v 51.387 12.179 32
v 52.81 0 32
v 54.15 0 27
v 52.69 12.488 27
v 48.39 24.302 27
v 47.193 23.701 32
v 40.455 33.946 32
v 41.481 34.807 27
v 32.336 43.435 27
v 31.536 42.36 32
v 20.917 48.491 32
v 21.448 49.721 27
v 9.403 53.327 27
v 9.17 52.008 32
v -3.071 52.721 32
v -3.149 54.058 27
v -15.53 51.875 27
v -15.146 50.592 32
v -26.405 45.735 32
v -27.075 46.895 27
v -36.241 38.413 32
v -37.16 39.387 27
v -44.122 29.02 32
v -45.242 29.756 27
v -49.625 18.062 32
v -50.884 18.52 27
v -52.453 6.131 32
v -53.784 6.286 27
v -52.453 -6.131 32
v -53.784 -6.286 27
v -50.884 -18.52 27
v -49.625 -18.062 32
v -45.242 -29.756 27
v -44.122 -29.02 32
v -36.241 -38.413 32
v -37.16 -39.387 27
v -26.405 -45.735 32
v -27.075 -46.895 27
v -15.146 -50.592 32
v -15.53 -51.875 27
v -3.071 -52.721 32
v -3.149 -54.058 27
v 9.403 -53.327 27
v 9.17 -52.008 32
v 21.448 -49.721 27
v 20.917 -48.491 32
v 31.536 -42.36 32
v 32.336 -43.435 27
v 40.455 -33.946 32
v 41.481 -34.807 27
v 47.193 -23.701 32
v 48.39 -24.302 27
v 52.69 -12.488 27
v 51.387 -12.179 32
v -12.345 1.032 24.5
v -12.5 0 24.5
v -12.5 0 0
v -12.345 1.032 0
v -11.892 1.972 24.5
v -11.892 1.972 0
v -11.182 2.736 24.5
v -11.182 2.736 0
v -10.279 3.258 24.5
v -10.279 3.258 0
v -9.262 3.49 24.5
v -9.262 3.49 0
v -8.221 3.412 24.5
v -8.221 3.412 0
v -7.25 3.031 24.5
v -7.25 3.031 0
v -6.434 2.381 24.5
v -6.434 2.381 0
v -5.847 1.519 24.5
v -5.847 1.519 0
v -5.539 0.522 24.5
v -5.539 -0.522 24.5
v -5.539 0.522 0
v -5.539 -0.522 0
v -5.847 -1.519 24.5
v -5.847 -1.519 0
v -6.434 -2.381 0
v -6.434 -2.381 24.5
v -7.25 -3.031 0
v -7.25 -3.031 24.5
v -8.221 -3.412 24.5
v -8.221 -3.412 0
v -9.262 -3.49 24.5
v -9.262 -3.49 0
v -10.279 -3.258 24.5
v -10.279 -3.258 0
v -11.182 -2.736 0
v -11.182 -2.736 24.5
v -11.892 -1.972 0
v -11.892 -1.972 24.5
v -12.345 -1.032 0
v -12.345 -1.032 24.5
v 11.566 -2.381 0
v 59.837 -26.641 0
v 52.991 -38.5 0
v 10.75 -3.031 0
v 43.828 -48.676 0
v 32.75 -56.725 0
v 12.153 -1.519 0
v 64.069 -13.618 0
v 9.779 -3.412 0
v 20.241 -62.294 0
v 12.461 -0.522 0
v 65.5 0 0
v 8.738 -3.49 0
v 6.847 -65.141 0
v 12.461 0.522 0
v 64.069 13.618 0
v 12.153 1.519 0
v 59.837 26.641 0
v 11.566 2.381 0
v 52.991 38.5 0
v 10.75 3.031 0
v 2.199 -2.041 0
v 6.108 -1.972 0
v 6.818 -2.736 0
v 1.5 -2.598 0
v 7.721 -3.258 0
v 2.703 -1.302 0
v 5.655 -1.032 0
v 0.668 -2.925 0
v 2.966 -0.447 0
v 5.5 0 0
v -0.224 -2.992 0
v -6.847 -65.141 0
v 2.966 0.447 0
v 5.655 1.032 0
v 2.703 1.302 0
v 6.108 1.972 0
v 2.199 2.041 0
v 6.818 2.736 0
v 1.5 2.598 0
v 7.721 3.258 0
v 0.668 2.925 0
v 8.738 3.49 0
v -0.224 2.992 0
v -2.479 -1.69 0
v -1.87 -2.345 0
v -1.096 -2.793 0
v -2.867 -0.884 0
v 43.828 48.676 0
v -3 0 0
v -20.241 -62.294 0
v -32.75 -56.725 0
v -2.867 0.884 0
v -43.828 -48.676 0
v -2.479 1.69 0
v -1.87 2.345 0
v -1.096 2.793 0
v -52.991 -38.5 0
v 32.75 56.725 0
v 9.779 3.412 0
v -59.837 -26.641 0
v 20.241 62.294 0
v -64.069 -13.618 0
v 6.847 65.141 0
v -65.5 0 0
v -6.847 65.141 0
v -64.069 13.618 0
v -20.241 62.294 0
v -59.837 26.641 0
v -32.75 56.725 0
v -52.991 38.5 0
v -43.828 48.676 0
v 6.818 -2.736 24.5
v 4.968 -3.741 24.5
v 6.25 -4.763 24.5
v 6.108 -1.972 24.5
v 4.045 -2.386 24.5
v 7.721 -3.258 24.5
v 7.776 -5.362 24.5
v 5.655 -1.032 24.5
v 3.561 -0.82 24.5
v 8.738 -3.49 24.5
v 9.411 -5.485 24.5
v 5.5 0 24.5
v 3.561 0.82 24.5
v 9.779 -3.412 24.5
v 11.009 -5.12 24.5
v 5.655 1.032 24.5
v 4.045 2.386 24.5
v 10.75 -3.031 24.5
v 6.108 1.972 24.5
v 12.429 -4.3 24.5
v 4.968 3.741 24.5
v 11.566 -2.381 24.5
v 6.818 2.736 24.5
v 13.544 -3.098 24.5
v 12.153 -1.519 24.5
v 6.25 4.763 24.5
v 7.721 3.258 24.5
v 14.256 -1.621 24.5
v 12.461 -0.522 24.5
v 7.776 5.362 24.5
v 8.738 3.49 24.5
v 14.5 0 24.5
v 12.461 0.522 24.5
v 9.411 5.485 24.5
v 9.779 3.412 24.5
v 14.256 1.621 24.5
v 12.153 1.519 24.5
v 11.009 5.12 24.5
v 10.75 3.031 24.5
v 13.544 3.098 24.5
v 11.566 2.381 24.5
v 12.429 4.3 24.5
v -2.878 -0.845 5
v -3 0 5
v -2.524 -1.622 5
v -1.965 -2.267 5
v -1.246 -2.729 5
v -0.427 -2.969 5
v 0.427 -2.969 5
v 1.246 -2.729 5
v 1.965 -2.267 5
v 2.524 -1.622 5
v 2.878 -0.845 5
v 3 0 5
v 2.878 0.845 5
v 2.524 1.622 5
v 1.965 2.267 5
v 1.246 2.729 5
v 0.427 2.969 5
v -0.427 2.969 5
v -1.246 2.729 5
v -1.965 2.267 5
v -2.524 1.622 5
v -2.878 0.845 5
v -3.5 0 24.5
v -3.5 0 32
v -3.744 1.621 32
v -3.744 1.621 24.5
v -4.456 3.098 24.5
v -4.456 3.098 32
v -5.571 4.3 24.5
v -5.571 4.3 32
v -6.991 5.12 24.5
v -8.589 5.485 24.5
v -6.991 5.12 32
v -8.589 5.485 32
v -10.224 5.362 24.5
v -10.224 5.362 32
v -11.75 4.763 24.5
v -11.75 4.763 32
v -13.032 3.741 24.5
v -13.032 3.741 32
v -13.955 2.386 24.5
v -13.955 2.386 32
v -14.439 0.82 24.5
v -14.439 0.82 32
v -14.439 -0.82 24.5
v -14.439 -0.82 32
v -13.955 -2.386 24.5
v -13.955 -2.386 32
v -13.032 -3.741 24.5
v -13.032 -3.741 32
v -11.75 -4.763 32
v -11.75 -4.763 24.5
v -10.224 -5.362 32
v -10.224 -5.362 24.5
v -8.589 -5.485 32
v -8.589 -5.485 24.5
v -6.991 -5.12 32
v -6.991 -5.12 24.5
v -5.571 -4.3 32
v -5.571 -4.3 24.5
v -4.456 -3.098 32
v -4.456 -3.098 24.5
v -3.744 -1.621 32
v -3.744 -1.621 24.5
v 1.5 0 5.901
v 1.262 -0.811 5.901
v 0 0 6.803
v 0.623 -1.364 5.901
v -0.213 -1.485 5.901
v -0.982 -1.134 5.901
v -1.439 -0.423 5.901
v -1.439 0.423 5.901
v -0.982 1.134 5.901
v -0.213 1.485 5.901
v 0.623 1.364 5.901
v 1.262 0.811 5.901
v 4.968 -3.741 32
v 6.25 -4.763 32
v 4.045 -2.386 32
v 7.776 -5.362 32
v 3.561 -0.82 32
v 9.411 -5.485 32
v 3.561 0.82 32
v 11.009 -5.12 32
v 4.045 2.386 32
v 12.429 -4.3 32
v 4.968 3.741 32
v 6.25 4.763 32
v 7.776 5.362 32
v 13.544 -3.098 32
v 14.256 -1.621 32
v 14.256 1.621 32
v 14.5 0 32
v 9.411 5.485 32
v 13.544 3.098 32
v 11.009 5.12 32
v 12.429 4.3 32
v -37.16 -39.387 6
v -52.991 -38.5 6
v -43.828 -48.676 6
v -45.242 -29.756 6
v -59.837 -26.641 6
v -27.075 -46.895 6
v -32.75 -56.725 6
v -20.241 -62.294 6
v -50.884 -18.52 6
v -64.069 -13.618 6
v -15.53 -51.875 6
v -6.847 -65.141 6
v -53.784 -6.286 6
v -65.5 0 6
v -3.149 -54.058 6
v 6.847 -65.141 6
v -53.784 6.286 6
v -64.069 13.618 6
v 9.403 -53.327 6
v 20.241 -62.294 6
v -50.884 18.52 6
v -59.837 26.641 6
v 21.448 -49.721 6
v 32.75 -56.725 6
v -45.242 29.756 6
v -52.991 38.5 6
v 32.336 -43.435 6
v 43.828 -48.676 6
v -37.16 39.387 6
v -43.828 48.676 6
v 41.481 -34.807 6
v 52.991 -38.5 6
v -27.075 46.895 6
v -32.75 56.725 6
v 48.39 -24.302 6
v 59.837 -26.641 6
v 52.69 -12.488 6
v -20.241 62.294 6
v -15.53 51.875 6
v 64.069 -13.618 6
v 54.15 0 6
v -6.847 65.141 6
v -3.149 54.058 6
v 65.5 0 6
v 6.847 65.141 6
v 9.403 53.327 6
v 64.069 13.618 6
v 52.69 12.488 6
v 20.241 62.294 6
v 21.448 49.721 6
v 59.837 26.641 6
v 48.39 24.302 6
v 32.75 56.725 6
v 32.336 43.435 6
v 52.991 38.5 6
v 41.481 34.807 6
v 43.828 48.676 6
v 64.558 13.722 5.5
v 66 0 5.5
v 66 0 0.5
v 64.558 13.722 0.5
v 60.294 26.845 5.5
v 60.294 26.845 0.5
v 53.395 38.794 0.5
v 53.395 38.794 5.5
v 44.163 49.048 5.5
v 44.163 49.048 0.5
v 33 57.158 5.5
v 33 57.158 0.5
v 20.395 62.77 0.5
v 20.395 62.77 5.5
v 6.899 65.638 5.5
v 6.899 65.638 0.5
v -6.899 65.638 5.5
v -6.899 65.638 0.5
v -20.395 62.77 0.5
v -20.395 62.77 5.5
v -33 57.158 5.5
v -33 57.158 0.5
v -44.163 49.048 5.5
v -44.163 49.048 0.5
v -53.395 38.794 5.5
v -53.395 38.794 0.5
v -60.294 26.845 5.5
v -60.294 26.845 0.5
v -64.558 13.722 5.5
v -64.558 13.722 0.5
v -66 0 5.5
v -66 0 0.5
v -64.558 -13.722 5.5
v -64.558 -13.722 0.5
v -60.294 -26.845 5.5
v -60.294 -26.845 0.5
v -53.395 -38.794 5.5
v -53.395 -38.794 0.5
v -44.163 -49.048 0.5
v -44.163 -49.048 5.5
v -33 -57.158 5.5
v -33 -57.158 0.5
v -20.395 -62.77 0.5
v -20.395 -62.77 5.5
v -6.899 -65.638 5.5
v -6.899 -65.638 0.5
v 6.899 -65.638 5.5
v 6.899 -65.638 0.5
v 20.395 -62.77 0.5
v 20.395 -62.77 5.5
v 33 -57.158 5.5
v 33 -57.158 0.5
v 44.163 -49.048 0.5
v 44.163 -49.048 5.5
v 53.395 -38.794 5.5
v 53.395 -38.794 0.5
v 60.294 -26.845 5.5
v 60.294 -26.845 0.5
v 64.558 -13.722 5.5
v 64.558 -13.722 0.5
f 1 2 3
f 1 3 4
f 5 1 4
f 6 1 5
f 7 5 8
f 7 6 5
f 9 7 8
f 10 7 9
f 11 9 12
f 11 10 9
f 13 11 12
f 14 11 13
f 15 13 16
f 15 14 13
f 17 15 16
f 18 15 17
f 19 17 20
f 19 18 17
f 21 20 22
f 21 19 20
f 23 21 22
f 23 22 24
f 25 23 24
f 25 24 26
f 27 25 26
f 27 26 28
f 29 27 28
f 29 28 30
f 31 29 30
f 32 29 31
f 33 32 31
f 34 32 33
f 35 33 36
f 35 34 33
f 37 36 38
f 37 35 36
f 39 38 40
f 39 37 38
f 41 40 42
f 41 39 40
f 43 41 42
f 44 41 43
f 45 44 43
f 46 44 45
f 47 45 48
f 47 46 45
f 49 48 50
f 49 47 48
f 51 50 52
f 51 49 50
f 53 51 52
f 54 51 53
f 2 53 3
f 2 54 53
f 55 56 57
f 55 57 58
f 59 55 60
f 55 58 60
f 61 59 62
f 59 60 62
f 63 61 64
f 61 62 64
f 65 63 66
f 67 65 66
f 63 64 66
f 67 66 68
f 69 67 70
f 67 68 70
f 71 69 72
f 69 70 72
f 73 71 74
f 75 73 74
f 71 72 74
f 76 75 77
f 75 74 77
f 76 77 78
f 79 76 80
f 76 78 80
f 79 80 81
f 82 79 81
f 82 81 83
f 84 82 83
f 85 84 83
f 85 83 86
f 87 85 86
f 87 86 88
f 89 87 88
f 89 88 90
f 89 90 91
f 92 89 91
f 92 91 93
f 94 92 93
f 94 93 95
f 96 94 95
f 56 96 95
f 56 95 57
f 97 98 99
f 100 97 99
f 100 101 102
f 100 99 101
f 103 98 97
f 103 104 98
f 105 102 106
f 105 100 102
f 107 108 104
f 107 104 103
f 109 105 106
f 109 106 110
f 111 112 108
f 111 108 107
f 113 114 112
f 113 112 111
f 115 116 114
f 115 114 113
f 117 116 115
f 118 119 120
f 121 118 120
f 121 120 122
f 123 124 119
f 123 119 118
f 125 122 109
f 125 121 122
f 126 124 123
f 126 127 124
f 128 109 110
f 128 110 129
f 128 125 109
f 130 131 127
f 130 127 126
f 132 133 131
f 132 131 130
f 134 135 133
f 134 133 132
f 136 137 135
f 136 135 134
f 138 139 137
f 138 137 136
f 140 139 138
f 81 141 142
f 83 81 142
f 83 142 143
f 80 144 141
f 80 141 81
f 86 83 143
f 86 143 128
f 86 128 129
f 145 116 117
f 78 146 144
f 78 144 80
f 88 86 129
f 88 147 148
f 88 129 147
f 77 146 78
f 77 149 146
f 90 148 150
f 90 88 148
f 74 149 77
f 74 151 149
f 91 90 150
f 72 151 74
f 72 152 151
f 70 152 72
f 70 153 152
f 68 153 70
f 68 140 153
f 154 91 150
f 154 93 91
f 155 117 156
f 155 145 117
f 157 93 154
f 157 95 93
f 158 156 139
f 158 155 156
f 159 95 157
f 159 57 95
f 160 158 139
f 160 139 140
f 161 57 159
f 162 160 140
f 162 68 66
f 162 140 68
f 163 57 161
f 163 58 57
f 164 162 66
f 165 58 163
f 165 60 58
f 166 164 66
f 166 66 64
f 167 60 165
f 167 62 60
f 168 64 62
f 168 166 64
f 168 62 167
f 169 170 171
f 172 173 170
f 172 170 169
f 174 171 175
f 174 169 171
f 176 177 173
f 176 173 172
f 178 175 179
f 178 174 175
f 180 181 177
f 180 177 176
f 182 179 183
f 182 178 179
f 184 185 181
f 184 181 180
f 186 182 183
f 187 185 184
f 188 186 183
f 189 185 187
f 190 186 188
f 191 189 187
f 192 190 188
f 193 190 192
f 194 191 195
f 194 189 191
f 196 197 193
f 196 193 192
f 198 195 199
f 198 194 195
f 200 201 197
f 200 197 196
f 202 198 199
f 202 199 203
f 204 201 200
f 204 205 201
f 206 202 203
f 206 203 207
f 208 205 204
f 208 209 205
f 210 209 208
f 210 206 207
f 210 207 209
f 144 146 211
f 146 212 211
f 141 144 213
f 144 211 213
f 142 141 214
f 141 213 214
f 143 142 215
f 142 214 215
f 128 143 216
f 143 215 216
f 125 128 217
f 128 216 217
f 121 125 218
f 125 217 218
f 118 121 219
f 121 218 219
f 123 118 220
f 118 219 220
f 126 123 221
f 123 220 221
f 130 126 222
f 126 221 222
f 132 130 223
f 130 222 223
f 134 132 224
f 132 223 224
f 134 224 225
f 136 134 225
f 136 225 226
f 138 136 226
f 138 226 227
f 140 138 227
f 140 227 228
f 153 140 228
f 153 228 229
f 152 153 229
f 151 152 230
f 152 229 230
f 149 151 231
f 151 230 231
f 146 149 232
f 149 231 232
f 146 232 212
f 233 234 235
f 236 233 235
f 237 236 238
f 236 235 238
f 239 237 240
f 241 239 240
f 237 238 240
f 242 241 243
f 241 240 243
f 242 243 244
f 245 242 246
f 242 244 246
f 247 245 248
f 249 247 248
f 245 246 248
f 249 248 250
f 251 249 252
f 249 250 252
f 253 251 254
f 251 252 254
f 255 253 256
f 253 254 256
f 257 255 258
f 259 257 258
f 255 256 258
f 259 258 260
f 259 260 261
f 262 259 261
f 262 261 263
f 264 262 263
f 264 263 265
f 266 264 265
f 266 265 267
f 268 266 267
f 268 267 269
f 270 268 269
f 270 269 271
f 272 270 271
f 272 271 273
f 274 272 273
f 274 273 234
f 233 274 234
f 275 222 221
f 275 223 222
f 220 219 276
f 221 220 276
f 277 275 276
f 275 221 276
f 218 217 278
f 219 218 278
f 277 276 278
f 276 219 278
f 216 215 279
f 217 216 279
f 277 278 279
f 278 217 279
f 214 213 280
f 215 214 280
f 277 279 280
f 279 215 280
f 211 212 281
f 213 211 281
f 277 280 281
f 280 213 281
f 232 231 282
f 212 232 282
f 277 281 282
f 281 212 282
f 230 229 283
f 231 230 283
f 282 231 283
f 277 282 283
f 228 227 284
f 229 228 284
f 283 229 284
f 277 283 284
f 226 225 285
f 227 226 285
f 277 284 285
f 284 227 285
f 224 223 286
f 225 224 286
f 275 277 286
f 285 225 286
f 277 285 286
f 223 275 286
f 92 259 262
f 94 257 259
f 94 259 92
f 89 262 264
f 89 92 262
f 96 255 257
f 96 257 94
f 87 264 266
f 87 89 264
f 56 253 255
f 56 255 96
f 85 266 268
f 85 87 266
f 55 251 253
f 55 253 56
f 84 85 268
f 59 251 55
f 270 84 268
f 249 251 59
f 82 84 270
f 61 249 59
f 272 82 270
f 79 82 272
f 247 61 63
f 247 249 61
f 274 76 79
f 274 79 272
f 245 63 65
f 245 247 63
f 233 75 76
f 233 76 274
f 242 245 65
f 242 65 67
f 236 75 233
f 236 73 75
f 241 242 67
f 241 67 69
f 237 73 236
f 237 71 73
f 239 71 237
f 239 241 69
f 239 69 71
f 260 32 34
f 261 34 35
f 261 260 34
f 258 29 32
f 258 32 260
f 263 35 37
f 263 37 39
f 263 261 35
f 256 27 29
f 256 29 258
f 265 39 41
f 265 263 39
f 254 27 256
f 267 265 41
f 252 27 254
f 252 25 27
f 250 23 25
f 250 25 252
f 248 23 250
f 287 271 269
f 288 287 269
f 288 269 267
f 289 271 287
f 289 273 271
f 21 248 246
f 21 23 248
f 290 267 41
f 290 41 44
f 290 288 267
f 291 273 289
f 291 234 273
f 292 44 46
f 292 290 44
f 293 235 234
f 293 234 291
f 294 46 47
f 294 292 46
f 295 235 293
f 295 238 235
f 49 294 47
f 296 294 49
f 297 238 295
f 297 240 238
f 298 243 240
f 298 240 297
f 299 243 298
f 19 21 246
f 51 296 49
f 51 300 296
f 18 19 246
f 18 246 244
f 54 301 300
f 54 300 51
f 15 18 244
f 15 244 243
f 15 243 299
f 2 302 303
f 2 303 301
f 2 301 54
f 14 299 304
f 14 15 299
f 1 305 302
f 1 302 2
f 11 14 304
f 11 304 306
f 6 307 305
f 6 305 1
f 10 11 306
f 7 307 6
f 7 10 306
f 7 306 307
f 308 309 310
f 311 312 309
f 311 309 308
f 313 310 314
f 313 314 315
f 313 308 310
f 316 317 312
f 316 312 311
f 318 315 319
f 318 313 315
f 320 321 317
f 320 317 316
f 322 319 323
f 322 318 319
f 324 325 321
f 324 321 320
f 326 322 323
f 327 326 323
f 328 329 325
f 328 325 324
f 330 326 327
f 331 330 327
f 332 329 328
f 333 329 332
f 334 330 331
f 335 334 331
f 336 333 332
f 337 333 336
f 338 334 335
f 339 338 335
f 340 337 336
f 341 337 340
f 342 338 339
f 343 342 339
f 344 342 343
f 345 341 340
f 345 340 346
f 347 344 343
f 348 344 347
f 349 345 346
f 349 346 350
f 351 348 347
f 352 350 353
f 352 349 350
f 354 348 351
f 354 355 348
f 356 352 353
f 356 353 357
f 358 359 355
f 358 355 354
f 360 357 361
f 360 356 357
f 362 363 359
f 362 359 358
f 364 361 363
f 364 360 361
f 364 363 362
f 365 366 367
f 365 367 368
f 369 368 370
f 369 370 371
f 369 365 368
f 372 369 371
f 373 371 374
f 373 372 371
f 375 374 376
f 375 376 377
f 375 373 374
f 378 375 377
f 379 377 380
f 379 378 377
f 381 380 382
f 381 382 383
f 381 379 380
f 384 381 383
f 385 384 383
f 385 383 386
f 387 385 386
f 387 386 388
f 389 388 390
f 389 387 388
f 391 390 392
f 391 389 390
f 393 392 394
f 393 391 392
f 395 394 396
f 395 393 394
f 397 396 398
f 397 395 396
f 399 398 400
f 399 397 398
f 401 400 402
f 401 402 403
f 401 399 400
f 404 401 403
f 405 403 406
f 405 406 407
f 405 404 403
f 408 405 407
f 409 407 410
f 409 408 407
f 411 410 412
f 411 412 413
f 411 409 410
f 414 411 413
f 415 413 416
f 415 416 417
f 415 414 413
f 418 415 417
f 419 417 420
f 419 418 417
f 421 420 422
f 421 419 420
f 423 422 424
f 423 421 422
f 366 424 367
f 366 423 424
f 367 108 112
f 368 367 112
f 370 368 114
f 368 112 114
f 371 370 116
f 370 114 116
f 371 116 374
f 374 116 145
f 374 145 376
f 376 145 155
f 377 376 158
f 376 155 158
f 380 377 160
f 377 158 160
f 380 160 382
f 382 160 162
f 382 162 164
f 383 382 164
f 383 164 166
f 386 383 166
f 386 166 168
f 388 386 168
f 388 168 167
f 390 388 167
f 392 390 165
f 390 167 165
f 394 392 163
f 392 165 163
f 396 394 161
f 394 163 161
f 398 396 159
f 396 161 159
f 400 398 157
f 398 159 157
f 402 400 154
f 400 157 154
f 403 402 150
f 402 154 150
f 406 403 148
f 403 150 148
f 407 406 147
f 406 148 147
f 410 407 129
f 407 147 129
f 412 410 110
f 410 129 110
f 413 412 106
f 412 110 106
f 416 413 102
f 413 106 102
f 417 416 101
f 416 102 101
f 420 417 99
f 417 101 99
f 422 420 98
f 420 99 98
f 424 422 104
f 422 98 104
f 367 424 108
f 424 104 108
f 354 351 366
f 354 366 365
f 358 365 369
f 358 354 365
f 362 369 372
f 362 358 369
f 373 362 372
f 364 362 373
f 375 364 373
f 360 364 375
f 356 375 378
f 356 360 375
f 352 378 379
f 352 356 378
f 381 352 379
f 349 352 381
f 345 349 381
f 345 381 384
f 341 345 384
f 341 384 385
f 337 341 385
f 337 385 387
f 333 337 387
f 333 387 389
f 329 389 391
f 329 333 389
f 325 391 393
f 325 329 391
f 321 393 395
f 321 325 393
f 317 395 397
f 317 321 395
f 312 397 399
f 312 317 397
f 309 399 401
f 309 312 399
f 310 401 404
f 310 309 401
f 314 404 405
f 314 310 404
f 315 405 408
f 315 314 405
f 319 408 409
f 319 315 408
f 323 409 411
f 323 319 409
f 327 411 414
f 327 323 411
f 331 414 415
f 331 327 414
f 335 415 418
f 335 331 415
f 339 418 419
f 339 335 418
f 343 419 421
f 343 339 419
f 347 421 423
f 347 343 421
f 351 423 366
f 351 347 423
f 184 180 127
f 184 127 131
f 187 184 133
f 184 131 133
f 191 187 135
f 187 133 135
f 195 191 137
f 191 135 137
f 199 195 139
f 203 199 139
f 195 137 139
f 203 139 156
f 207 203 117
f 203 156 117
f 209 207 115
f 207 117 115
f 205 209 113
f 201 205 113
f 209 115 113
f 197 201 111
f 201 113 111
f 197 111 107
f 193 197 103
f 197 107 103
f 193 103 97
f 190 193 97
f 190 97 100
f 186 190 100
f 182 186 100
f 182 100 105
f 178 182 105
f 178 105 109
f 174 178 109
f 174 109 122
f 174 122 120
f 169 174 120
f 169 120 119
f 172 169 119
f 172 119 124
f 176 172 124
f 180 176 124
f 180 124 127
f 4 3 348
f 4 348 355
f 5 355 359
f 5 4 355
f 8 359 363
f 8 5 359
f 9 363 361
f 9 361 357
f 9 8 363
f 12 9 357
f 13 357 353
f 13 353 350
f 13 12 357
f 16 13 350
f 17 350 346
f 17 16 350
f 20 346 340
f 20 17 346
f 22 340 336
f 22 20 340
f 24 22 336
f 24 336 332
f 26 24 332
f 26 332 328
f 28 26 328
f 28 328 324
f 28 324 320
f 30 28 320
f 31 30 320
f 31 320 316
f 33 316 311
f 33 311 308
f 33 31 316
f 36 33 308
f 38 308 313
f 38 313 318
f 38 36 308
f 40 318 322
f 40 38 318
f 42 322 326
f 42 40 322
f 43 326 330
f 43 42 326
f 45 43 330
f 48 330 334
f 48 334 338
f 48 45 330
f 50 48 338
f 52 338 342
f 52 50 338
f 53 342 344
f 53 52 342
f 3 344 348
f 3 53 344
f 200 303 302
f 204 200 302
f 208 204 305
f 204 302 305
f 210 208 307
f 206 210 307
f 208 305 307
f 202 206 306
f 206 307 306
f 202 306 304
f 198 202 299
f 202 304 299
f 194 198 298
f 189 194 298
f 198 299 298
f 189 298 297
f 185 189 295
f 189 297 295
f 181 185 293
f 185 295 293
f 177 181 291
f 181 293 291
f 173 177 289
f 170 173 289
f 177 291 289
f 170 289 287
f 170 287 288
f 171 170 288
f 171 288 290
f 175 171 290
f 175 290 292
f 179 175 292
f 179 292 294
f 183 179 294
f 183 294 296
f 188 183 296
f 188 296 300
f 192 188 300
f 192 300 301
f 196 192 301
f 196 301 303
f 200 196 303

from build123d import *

# Parameters (mm, degrees)
F2_SIZE        = 0.5
F3_SIZE        = 0.5
F4_SIZE2       = 1.3397459622
F4_SIZE        = 5
F6_D           = 7
F7_D           = 7
F7_CBORE_D     = 11
F7_CBORE_DEPTH = 7.5
F9_D           = 6
F9_DEPTH       = 5
F9_TIP         = 1.8025818571


with BuildPart() as f1:
    # F0 (on Front) → F1 (revolve)
    with BuildSketch(Plane.XZ):
        Polygon((0, 32), (0, 0), (66, 0), (66, 6), (54.15, 6), (54.15, 32), align=None)
    revolve(axis=Axis((0, 0, 31.825657934), (0, 0, 1)))

    # F2
    f2_edges = [f1.edges().sort_by_distance(p)[0] for p in [
        (-66, 0, 6),
    ]]
    chamfer(f2_edges, length=F2_SIZE)

    # F3
    f3_edges = [f1.edges().sort_by_distance(p)[0] for p in [
        (-66, 0, 0),
    ]]
    chamfer(f3_edges, length=F3_SIZE)

    # F4
    f4_edges = [f1.edges().sort_by_distance(p)[0] for p in [
        (-54.15, 0, 32),
    ]]
    chamfer(f4_edges, length=F4_SIZE, length2=F4_SIZE2)

    # F6 (through all)
    with Locations(Plane.XY.offset(32)):
        with Locations((-9, 0), (9, 0)):
            Hole(F6_D / 2)

    # F7 (through all)
    with Locations(Plane.XY.offset(32)):
        with Locations((9, 0), (-9, 0)):
            CounterBoreHole(F7_D / 2, F7_CBORE_D / 2, F7_CBORE_DEPTH)

    # F9
    with Locations(Plane(origin=(0, 0, 0), x_dir=(1, 0, 0), z_dir=(0, 0, -1))):
        with Locations((0, 0)):
            Hole(F9_D / 2, depth=F9_DEPTH)
            with Locations((0, 0, -(F9_DEPTH + F9_TIP / 2))):  # 118° drill point
                Cone(0, F9_D / 2, F9_TIP, mode=Mode.SUBTRACT)


solid = f1.part
